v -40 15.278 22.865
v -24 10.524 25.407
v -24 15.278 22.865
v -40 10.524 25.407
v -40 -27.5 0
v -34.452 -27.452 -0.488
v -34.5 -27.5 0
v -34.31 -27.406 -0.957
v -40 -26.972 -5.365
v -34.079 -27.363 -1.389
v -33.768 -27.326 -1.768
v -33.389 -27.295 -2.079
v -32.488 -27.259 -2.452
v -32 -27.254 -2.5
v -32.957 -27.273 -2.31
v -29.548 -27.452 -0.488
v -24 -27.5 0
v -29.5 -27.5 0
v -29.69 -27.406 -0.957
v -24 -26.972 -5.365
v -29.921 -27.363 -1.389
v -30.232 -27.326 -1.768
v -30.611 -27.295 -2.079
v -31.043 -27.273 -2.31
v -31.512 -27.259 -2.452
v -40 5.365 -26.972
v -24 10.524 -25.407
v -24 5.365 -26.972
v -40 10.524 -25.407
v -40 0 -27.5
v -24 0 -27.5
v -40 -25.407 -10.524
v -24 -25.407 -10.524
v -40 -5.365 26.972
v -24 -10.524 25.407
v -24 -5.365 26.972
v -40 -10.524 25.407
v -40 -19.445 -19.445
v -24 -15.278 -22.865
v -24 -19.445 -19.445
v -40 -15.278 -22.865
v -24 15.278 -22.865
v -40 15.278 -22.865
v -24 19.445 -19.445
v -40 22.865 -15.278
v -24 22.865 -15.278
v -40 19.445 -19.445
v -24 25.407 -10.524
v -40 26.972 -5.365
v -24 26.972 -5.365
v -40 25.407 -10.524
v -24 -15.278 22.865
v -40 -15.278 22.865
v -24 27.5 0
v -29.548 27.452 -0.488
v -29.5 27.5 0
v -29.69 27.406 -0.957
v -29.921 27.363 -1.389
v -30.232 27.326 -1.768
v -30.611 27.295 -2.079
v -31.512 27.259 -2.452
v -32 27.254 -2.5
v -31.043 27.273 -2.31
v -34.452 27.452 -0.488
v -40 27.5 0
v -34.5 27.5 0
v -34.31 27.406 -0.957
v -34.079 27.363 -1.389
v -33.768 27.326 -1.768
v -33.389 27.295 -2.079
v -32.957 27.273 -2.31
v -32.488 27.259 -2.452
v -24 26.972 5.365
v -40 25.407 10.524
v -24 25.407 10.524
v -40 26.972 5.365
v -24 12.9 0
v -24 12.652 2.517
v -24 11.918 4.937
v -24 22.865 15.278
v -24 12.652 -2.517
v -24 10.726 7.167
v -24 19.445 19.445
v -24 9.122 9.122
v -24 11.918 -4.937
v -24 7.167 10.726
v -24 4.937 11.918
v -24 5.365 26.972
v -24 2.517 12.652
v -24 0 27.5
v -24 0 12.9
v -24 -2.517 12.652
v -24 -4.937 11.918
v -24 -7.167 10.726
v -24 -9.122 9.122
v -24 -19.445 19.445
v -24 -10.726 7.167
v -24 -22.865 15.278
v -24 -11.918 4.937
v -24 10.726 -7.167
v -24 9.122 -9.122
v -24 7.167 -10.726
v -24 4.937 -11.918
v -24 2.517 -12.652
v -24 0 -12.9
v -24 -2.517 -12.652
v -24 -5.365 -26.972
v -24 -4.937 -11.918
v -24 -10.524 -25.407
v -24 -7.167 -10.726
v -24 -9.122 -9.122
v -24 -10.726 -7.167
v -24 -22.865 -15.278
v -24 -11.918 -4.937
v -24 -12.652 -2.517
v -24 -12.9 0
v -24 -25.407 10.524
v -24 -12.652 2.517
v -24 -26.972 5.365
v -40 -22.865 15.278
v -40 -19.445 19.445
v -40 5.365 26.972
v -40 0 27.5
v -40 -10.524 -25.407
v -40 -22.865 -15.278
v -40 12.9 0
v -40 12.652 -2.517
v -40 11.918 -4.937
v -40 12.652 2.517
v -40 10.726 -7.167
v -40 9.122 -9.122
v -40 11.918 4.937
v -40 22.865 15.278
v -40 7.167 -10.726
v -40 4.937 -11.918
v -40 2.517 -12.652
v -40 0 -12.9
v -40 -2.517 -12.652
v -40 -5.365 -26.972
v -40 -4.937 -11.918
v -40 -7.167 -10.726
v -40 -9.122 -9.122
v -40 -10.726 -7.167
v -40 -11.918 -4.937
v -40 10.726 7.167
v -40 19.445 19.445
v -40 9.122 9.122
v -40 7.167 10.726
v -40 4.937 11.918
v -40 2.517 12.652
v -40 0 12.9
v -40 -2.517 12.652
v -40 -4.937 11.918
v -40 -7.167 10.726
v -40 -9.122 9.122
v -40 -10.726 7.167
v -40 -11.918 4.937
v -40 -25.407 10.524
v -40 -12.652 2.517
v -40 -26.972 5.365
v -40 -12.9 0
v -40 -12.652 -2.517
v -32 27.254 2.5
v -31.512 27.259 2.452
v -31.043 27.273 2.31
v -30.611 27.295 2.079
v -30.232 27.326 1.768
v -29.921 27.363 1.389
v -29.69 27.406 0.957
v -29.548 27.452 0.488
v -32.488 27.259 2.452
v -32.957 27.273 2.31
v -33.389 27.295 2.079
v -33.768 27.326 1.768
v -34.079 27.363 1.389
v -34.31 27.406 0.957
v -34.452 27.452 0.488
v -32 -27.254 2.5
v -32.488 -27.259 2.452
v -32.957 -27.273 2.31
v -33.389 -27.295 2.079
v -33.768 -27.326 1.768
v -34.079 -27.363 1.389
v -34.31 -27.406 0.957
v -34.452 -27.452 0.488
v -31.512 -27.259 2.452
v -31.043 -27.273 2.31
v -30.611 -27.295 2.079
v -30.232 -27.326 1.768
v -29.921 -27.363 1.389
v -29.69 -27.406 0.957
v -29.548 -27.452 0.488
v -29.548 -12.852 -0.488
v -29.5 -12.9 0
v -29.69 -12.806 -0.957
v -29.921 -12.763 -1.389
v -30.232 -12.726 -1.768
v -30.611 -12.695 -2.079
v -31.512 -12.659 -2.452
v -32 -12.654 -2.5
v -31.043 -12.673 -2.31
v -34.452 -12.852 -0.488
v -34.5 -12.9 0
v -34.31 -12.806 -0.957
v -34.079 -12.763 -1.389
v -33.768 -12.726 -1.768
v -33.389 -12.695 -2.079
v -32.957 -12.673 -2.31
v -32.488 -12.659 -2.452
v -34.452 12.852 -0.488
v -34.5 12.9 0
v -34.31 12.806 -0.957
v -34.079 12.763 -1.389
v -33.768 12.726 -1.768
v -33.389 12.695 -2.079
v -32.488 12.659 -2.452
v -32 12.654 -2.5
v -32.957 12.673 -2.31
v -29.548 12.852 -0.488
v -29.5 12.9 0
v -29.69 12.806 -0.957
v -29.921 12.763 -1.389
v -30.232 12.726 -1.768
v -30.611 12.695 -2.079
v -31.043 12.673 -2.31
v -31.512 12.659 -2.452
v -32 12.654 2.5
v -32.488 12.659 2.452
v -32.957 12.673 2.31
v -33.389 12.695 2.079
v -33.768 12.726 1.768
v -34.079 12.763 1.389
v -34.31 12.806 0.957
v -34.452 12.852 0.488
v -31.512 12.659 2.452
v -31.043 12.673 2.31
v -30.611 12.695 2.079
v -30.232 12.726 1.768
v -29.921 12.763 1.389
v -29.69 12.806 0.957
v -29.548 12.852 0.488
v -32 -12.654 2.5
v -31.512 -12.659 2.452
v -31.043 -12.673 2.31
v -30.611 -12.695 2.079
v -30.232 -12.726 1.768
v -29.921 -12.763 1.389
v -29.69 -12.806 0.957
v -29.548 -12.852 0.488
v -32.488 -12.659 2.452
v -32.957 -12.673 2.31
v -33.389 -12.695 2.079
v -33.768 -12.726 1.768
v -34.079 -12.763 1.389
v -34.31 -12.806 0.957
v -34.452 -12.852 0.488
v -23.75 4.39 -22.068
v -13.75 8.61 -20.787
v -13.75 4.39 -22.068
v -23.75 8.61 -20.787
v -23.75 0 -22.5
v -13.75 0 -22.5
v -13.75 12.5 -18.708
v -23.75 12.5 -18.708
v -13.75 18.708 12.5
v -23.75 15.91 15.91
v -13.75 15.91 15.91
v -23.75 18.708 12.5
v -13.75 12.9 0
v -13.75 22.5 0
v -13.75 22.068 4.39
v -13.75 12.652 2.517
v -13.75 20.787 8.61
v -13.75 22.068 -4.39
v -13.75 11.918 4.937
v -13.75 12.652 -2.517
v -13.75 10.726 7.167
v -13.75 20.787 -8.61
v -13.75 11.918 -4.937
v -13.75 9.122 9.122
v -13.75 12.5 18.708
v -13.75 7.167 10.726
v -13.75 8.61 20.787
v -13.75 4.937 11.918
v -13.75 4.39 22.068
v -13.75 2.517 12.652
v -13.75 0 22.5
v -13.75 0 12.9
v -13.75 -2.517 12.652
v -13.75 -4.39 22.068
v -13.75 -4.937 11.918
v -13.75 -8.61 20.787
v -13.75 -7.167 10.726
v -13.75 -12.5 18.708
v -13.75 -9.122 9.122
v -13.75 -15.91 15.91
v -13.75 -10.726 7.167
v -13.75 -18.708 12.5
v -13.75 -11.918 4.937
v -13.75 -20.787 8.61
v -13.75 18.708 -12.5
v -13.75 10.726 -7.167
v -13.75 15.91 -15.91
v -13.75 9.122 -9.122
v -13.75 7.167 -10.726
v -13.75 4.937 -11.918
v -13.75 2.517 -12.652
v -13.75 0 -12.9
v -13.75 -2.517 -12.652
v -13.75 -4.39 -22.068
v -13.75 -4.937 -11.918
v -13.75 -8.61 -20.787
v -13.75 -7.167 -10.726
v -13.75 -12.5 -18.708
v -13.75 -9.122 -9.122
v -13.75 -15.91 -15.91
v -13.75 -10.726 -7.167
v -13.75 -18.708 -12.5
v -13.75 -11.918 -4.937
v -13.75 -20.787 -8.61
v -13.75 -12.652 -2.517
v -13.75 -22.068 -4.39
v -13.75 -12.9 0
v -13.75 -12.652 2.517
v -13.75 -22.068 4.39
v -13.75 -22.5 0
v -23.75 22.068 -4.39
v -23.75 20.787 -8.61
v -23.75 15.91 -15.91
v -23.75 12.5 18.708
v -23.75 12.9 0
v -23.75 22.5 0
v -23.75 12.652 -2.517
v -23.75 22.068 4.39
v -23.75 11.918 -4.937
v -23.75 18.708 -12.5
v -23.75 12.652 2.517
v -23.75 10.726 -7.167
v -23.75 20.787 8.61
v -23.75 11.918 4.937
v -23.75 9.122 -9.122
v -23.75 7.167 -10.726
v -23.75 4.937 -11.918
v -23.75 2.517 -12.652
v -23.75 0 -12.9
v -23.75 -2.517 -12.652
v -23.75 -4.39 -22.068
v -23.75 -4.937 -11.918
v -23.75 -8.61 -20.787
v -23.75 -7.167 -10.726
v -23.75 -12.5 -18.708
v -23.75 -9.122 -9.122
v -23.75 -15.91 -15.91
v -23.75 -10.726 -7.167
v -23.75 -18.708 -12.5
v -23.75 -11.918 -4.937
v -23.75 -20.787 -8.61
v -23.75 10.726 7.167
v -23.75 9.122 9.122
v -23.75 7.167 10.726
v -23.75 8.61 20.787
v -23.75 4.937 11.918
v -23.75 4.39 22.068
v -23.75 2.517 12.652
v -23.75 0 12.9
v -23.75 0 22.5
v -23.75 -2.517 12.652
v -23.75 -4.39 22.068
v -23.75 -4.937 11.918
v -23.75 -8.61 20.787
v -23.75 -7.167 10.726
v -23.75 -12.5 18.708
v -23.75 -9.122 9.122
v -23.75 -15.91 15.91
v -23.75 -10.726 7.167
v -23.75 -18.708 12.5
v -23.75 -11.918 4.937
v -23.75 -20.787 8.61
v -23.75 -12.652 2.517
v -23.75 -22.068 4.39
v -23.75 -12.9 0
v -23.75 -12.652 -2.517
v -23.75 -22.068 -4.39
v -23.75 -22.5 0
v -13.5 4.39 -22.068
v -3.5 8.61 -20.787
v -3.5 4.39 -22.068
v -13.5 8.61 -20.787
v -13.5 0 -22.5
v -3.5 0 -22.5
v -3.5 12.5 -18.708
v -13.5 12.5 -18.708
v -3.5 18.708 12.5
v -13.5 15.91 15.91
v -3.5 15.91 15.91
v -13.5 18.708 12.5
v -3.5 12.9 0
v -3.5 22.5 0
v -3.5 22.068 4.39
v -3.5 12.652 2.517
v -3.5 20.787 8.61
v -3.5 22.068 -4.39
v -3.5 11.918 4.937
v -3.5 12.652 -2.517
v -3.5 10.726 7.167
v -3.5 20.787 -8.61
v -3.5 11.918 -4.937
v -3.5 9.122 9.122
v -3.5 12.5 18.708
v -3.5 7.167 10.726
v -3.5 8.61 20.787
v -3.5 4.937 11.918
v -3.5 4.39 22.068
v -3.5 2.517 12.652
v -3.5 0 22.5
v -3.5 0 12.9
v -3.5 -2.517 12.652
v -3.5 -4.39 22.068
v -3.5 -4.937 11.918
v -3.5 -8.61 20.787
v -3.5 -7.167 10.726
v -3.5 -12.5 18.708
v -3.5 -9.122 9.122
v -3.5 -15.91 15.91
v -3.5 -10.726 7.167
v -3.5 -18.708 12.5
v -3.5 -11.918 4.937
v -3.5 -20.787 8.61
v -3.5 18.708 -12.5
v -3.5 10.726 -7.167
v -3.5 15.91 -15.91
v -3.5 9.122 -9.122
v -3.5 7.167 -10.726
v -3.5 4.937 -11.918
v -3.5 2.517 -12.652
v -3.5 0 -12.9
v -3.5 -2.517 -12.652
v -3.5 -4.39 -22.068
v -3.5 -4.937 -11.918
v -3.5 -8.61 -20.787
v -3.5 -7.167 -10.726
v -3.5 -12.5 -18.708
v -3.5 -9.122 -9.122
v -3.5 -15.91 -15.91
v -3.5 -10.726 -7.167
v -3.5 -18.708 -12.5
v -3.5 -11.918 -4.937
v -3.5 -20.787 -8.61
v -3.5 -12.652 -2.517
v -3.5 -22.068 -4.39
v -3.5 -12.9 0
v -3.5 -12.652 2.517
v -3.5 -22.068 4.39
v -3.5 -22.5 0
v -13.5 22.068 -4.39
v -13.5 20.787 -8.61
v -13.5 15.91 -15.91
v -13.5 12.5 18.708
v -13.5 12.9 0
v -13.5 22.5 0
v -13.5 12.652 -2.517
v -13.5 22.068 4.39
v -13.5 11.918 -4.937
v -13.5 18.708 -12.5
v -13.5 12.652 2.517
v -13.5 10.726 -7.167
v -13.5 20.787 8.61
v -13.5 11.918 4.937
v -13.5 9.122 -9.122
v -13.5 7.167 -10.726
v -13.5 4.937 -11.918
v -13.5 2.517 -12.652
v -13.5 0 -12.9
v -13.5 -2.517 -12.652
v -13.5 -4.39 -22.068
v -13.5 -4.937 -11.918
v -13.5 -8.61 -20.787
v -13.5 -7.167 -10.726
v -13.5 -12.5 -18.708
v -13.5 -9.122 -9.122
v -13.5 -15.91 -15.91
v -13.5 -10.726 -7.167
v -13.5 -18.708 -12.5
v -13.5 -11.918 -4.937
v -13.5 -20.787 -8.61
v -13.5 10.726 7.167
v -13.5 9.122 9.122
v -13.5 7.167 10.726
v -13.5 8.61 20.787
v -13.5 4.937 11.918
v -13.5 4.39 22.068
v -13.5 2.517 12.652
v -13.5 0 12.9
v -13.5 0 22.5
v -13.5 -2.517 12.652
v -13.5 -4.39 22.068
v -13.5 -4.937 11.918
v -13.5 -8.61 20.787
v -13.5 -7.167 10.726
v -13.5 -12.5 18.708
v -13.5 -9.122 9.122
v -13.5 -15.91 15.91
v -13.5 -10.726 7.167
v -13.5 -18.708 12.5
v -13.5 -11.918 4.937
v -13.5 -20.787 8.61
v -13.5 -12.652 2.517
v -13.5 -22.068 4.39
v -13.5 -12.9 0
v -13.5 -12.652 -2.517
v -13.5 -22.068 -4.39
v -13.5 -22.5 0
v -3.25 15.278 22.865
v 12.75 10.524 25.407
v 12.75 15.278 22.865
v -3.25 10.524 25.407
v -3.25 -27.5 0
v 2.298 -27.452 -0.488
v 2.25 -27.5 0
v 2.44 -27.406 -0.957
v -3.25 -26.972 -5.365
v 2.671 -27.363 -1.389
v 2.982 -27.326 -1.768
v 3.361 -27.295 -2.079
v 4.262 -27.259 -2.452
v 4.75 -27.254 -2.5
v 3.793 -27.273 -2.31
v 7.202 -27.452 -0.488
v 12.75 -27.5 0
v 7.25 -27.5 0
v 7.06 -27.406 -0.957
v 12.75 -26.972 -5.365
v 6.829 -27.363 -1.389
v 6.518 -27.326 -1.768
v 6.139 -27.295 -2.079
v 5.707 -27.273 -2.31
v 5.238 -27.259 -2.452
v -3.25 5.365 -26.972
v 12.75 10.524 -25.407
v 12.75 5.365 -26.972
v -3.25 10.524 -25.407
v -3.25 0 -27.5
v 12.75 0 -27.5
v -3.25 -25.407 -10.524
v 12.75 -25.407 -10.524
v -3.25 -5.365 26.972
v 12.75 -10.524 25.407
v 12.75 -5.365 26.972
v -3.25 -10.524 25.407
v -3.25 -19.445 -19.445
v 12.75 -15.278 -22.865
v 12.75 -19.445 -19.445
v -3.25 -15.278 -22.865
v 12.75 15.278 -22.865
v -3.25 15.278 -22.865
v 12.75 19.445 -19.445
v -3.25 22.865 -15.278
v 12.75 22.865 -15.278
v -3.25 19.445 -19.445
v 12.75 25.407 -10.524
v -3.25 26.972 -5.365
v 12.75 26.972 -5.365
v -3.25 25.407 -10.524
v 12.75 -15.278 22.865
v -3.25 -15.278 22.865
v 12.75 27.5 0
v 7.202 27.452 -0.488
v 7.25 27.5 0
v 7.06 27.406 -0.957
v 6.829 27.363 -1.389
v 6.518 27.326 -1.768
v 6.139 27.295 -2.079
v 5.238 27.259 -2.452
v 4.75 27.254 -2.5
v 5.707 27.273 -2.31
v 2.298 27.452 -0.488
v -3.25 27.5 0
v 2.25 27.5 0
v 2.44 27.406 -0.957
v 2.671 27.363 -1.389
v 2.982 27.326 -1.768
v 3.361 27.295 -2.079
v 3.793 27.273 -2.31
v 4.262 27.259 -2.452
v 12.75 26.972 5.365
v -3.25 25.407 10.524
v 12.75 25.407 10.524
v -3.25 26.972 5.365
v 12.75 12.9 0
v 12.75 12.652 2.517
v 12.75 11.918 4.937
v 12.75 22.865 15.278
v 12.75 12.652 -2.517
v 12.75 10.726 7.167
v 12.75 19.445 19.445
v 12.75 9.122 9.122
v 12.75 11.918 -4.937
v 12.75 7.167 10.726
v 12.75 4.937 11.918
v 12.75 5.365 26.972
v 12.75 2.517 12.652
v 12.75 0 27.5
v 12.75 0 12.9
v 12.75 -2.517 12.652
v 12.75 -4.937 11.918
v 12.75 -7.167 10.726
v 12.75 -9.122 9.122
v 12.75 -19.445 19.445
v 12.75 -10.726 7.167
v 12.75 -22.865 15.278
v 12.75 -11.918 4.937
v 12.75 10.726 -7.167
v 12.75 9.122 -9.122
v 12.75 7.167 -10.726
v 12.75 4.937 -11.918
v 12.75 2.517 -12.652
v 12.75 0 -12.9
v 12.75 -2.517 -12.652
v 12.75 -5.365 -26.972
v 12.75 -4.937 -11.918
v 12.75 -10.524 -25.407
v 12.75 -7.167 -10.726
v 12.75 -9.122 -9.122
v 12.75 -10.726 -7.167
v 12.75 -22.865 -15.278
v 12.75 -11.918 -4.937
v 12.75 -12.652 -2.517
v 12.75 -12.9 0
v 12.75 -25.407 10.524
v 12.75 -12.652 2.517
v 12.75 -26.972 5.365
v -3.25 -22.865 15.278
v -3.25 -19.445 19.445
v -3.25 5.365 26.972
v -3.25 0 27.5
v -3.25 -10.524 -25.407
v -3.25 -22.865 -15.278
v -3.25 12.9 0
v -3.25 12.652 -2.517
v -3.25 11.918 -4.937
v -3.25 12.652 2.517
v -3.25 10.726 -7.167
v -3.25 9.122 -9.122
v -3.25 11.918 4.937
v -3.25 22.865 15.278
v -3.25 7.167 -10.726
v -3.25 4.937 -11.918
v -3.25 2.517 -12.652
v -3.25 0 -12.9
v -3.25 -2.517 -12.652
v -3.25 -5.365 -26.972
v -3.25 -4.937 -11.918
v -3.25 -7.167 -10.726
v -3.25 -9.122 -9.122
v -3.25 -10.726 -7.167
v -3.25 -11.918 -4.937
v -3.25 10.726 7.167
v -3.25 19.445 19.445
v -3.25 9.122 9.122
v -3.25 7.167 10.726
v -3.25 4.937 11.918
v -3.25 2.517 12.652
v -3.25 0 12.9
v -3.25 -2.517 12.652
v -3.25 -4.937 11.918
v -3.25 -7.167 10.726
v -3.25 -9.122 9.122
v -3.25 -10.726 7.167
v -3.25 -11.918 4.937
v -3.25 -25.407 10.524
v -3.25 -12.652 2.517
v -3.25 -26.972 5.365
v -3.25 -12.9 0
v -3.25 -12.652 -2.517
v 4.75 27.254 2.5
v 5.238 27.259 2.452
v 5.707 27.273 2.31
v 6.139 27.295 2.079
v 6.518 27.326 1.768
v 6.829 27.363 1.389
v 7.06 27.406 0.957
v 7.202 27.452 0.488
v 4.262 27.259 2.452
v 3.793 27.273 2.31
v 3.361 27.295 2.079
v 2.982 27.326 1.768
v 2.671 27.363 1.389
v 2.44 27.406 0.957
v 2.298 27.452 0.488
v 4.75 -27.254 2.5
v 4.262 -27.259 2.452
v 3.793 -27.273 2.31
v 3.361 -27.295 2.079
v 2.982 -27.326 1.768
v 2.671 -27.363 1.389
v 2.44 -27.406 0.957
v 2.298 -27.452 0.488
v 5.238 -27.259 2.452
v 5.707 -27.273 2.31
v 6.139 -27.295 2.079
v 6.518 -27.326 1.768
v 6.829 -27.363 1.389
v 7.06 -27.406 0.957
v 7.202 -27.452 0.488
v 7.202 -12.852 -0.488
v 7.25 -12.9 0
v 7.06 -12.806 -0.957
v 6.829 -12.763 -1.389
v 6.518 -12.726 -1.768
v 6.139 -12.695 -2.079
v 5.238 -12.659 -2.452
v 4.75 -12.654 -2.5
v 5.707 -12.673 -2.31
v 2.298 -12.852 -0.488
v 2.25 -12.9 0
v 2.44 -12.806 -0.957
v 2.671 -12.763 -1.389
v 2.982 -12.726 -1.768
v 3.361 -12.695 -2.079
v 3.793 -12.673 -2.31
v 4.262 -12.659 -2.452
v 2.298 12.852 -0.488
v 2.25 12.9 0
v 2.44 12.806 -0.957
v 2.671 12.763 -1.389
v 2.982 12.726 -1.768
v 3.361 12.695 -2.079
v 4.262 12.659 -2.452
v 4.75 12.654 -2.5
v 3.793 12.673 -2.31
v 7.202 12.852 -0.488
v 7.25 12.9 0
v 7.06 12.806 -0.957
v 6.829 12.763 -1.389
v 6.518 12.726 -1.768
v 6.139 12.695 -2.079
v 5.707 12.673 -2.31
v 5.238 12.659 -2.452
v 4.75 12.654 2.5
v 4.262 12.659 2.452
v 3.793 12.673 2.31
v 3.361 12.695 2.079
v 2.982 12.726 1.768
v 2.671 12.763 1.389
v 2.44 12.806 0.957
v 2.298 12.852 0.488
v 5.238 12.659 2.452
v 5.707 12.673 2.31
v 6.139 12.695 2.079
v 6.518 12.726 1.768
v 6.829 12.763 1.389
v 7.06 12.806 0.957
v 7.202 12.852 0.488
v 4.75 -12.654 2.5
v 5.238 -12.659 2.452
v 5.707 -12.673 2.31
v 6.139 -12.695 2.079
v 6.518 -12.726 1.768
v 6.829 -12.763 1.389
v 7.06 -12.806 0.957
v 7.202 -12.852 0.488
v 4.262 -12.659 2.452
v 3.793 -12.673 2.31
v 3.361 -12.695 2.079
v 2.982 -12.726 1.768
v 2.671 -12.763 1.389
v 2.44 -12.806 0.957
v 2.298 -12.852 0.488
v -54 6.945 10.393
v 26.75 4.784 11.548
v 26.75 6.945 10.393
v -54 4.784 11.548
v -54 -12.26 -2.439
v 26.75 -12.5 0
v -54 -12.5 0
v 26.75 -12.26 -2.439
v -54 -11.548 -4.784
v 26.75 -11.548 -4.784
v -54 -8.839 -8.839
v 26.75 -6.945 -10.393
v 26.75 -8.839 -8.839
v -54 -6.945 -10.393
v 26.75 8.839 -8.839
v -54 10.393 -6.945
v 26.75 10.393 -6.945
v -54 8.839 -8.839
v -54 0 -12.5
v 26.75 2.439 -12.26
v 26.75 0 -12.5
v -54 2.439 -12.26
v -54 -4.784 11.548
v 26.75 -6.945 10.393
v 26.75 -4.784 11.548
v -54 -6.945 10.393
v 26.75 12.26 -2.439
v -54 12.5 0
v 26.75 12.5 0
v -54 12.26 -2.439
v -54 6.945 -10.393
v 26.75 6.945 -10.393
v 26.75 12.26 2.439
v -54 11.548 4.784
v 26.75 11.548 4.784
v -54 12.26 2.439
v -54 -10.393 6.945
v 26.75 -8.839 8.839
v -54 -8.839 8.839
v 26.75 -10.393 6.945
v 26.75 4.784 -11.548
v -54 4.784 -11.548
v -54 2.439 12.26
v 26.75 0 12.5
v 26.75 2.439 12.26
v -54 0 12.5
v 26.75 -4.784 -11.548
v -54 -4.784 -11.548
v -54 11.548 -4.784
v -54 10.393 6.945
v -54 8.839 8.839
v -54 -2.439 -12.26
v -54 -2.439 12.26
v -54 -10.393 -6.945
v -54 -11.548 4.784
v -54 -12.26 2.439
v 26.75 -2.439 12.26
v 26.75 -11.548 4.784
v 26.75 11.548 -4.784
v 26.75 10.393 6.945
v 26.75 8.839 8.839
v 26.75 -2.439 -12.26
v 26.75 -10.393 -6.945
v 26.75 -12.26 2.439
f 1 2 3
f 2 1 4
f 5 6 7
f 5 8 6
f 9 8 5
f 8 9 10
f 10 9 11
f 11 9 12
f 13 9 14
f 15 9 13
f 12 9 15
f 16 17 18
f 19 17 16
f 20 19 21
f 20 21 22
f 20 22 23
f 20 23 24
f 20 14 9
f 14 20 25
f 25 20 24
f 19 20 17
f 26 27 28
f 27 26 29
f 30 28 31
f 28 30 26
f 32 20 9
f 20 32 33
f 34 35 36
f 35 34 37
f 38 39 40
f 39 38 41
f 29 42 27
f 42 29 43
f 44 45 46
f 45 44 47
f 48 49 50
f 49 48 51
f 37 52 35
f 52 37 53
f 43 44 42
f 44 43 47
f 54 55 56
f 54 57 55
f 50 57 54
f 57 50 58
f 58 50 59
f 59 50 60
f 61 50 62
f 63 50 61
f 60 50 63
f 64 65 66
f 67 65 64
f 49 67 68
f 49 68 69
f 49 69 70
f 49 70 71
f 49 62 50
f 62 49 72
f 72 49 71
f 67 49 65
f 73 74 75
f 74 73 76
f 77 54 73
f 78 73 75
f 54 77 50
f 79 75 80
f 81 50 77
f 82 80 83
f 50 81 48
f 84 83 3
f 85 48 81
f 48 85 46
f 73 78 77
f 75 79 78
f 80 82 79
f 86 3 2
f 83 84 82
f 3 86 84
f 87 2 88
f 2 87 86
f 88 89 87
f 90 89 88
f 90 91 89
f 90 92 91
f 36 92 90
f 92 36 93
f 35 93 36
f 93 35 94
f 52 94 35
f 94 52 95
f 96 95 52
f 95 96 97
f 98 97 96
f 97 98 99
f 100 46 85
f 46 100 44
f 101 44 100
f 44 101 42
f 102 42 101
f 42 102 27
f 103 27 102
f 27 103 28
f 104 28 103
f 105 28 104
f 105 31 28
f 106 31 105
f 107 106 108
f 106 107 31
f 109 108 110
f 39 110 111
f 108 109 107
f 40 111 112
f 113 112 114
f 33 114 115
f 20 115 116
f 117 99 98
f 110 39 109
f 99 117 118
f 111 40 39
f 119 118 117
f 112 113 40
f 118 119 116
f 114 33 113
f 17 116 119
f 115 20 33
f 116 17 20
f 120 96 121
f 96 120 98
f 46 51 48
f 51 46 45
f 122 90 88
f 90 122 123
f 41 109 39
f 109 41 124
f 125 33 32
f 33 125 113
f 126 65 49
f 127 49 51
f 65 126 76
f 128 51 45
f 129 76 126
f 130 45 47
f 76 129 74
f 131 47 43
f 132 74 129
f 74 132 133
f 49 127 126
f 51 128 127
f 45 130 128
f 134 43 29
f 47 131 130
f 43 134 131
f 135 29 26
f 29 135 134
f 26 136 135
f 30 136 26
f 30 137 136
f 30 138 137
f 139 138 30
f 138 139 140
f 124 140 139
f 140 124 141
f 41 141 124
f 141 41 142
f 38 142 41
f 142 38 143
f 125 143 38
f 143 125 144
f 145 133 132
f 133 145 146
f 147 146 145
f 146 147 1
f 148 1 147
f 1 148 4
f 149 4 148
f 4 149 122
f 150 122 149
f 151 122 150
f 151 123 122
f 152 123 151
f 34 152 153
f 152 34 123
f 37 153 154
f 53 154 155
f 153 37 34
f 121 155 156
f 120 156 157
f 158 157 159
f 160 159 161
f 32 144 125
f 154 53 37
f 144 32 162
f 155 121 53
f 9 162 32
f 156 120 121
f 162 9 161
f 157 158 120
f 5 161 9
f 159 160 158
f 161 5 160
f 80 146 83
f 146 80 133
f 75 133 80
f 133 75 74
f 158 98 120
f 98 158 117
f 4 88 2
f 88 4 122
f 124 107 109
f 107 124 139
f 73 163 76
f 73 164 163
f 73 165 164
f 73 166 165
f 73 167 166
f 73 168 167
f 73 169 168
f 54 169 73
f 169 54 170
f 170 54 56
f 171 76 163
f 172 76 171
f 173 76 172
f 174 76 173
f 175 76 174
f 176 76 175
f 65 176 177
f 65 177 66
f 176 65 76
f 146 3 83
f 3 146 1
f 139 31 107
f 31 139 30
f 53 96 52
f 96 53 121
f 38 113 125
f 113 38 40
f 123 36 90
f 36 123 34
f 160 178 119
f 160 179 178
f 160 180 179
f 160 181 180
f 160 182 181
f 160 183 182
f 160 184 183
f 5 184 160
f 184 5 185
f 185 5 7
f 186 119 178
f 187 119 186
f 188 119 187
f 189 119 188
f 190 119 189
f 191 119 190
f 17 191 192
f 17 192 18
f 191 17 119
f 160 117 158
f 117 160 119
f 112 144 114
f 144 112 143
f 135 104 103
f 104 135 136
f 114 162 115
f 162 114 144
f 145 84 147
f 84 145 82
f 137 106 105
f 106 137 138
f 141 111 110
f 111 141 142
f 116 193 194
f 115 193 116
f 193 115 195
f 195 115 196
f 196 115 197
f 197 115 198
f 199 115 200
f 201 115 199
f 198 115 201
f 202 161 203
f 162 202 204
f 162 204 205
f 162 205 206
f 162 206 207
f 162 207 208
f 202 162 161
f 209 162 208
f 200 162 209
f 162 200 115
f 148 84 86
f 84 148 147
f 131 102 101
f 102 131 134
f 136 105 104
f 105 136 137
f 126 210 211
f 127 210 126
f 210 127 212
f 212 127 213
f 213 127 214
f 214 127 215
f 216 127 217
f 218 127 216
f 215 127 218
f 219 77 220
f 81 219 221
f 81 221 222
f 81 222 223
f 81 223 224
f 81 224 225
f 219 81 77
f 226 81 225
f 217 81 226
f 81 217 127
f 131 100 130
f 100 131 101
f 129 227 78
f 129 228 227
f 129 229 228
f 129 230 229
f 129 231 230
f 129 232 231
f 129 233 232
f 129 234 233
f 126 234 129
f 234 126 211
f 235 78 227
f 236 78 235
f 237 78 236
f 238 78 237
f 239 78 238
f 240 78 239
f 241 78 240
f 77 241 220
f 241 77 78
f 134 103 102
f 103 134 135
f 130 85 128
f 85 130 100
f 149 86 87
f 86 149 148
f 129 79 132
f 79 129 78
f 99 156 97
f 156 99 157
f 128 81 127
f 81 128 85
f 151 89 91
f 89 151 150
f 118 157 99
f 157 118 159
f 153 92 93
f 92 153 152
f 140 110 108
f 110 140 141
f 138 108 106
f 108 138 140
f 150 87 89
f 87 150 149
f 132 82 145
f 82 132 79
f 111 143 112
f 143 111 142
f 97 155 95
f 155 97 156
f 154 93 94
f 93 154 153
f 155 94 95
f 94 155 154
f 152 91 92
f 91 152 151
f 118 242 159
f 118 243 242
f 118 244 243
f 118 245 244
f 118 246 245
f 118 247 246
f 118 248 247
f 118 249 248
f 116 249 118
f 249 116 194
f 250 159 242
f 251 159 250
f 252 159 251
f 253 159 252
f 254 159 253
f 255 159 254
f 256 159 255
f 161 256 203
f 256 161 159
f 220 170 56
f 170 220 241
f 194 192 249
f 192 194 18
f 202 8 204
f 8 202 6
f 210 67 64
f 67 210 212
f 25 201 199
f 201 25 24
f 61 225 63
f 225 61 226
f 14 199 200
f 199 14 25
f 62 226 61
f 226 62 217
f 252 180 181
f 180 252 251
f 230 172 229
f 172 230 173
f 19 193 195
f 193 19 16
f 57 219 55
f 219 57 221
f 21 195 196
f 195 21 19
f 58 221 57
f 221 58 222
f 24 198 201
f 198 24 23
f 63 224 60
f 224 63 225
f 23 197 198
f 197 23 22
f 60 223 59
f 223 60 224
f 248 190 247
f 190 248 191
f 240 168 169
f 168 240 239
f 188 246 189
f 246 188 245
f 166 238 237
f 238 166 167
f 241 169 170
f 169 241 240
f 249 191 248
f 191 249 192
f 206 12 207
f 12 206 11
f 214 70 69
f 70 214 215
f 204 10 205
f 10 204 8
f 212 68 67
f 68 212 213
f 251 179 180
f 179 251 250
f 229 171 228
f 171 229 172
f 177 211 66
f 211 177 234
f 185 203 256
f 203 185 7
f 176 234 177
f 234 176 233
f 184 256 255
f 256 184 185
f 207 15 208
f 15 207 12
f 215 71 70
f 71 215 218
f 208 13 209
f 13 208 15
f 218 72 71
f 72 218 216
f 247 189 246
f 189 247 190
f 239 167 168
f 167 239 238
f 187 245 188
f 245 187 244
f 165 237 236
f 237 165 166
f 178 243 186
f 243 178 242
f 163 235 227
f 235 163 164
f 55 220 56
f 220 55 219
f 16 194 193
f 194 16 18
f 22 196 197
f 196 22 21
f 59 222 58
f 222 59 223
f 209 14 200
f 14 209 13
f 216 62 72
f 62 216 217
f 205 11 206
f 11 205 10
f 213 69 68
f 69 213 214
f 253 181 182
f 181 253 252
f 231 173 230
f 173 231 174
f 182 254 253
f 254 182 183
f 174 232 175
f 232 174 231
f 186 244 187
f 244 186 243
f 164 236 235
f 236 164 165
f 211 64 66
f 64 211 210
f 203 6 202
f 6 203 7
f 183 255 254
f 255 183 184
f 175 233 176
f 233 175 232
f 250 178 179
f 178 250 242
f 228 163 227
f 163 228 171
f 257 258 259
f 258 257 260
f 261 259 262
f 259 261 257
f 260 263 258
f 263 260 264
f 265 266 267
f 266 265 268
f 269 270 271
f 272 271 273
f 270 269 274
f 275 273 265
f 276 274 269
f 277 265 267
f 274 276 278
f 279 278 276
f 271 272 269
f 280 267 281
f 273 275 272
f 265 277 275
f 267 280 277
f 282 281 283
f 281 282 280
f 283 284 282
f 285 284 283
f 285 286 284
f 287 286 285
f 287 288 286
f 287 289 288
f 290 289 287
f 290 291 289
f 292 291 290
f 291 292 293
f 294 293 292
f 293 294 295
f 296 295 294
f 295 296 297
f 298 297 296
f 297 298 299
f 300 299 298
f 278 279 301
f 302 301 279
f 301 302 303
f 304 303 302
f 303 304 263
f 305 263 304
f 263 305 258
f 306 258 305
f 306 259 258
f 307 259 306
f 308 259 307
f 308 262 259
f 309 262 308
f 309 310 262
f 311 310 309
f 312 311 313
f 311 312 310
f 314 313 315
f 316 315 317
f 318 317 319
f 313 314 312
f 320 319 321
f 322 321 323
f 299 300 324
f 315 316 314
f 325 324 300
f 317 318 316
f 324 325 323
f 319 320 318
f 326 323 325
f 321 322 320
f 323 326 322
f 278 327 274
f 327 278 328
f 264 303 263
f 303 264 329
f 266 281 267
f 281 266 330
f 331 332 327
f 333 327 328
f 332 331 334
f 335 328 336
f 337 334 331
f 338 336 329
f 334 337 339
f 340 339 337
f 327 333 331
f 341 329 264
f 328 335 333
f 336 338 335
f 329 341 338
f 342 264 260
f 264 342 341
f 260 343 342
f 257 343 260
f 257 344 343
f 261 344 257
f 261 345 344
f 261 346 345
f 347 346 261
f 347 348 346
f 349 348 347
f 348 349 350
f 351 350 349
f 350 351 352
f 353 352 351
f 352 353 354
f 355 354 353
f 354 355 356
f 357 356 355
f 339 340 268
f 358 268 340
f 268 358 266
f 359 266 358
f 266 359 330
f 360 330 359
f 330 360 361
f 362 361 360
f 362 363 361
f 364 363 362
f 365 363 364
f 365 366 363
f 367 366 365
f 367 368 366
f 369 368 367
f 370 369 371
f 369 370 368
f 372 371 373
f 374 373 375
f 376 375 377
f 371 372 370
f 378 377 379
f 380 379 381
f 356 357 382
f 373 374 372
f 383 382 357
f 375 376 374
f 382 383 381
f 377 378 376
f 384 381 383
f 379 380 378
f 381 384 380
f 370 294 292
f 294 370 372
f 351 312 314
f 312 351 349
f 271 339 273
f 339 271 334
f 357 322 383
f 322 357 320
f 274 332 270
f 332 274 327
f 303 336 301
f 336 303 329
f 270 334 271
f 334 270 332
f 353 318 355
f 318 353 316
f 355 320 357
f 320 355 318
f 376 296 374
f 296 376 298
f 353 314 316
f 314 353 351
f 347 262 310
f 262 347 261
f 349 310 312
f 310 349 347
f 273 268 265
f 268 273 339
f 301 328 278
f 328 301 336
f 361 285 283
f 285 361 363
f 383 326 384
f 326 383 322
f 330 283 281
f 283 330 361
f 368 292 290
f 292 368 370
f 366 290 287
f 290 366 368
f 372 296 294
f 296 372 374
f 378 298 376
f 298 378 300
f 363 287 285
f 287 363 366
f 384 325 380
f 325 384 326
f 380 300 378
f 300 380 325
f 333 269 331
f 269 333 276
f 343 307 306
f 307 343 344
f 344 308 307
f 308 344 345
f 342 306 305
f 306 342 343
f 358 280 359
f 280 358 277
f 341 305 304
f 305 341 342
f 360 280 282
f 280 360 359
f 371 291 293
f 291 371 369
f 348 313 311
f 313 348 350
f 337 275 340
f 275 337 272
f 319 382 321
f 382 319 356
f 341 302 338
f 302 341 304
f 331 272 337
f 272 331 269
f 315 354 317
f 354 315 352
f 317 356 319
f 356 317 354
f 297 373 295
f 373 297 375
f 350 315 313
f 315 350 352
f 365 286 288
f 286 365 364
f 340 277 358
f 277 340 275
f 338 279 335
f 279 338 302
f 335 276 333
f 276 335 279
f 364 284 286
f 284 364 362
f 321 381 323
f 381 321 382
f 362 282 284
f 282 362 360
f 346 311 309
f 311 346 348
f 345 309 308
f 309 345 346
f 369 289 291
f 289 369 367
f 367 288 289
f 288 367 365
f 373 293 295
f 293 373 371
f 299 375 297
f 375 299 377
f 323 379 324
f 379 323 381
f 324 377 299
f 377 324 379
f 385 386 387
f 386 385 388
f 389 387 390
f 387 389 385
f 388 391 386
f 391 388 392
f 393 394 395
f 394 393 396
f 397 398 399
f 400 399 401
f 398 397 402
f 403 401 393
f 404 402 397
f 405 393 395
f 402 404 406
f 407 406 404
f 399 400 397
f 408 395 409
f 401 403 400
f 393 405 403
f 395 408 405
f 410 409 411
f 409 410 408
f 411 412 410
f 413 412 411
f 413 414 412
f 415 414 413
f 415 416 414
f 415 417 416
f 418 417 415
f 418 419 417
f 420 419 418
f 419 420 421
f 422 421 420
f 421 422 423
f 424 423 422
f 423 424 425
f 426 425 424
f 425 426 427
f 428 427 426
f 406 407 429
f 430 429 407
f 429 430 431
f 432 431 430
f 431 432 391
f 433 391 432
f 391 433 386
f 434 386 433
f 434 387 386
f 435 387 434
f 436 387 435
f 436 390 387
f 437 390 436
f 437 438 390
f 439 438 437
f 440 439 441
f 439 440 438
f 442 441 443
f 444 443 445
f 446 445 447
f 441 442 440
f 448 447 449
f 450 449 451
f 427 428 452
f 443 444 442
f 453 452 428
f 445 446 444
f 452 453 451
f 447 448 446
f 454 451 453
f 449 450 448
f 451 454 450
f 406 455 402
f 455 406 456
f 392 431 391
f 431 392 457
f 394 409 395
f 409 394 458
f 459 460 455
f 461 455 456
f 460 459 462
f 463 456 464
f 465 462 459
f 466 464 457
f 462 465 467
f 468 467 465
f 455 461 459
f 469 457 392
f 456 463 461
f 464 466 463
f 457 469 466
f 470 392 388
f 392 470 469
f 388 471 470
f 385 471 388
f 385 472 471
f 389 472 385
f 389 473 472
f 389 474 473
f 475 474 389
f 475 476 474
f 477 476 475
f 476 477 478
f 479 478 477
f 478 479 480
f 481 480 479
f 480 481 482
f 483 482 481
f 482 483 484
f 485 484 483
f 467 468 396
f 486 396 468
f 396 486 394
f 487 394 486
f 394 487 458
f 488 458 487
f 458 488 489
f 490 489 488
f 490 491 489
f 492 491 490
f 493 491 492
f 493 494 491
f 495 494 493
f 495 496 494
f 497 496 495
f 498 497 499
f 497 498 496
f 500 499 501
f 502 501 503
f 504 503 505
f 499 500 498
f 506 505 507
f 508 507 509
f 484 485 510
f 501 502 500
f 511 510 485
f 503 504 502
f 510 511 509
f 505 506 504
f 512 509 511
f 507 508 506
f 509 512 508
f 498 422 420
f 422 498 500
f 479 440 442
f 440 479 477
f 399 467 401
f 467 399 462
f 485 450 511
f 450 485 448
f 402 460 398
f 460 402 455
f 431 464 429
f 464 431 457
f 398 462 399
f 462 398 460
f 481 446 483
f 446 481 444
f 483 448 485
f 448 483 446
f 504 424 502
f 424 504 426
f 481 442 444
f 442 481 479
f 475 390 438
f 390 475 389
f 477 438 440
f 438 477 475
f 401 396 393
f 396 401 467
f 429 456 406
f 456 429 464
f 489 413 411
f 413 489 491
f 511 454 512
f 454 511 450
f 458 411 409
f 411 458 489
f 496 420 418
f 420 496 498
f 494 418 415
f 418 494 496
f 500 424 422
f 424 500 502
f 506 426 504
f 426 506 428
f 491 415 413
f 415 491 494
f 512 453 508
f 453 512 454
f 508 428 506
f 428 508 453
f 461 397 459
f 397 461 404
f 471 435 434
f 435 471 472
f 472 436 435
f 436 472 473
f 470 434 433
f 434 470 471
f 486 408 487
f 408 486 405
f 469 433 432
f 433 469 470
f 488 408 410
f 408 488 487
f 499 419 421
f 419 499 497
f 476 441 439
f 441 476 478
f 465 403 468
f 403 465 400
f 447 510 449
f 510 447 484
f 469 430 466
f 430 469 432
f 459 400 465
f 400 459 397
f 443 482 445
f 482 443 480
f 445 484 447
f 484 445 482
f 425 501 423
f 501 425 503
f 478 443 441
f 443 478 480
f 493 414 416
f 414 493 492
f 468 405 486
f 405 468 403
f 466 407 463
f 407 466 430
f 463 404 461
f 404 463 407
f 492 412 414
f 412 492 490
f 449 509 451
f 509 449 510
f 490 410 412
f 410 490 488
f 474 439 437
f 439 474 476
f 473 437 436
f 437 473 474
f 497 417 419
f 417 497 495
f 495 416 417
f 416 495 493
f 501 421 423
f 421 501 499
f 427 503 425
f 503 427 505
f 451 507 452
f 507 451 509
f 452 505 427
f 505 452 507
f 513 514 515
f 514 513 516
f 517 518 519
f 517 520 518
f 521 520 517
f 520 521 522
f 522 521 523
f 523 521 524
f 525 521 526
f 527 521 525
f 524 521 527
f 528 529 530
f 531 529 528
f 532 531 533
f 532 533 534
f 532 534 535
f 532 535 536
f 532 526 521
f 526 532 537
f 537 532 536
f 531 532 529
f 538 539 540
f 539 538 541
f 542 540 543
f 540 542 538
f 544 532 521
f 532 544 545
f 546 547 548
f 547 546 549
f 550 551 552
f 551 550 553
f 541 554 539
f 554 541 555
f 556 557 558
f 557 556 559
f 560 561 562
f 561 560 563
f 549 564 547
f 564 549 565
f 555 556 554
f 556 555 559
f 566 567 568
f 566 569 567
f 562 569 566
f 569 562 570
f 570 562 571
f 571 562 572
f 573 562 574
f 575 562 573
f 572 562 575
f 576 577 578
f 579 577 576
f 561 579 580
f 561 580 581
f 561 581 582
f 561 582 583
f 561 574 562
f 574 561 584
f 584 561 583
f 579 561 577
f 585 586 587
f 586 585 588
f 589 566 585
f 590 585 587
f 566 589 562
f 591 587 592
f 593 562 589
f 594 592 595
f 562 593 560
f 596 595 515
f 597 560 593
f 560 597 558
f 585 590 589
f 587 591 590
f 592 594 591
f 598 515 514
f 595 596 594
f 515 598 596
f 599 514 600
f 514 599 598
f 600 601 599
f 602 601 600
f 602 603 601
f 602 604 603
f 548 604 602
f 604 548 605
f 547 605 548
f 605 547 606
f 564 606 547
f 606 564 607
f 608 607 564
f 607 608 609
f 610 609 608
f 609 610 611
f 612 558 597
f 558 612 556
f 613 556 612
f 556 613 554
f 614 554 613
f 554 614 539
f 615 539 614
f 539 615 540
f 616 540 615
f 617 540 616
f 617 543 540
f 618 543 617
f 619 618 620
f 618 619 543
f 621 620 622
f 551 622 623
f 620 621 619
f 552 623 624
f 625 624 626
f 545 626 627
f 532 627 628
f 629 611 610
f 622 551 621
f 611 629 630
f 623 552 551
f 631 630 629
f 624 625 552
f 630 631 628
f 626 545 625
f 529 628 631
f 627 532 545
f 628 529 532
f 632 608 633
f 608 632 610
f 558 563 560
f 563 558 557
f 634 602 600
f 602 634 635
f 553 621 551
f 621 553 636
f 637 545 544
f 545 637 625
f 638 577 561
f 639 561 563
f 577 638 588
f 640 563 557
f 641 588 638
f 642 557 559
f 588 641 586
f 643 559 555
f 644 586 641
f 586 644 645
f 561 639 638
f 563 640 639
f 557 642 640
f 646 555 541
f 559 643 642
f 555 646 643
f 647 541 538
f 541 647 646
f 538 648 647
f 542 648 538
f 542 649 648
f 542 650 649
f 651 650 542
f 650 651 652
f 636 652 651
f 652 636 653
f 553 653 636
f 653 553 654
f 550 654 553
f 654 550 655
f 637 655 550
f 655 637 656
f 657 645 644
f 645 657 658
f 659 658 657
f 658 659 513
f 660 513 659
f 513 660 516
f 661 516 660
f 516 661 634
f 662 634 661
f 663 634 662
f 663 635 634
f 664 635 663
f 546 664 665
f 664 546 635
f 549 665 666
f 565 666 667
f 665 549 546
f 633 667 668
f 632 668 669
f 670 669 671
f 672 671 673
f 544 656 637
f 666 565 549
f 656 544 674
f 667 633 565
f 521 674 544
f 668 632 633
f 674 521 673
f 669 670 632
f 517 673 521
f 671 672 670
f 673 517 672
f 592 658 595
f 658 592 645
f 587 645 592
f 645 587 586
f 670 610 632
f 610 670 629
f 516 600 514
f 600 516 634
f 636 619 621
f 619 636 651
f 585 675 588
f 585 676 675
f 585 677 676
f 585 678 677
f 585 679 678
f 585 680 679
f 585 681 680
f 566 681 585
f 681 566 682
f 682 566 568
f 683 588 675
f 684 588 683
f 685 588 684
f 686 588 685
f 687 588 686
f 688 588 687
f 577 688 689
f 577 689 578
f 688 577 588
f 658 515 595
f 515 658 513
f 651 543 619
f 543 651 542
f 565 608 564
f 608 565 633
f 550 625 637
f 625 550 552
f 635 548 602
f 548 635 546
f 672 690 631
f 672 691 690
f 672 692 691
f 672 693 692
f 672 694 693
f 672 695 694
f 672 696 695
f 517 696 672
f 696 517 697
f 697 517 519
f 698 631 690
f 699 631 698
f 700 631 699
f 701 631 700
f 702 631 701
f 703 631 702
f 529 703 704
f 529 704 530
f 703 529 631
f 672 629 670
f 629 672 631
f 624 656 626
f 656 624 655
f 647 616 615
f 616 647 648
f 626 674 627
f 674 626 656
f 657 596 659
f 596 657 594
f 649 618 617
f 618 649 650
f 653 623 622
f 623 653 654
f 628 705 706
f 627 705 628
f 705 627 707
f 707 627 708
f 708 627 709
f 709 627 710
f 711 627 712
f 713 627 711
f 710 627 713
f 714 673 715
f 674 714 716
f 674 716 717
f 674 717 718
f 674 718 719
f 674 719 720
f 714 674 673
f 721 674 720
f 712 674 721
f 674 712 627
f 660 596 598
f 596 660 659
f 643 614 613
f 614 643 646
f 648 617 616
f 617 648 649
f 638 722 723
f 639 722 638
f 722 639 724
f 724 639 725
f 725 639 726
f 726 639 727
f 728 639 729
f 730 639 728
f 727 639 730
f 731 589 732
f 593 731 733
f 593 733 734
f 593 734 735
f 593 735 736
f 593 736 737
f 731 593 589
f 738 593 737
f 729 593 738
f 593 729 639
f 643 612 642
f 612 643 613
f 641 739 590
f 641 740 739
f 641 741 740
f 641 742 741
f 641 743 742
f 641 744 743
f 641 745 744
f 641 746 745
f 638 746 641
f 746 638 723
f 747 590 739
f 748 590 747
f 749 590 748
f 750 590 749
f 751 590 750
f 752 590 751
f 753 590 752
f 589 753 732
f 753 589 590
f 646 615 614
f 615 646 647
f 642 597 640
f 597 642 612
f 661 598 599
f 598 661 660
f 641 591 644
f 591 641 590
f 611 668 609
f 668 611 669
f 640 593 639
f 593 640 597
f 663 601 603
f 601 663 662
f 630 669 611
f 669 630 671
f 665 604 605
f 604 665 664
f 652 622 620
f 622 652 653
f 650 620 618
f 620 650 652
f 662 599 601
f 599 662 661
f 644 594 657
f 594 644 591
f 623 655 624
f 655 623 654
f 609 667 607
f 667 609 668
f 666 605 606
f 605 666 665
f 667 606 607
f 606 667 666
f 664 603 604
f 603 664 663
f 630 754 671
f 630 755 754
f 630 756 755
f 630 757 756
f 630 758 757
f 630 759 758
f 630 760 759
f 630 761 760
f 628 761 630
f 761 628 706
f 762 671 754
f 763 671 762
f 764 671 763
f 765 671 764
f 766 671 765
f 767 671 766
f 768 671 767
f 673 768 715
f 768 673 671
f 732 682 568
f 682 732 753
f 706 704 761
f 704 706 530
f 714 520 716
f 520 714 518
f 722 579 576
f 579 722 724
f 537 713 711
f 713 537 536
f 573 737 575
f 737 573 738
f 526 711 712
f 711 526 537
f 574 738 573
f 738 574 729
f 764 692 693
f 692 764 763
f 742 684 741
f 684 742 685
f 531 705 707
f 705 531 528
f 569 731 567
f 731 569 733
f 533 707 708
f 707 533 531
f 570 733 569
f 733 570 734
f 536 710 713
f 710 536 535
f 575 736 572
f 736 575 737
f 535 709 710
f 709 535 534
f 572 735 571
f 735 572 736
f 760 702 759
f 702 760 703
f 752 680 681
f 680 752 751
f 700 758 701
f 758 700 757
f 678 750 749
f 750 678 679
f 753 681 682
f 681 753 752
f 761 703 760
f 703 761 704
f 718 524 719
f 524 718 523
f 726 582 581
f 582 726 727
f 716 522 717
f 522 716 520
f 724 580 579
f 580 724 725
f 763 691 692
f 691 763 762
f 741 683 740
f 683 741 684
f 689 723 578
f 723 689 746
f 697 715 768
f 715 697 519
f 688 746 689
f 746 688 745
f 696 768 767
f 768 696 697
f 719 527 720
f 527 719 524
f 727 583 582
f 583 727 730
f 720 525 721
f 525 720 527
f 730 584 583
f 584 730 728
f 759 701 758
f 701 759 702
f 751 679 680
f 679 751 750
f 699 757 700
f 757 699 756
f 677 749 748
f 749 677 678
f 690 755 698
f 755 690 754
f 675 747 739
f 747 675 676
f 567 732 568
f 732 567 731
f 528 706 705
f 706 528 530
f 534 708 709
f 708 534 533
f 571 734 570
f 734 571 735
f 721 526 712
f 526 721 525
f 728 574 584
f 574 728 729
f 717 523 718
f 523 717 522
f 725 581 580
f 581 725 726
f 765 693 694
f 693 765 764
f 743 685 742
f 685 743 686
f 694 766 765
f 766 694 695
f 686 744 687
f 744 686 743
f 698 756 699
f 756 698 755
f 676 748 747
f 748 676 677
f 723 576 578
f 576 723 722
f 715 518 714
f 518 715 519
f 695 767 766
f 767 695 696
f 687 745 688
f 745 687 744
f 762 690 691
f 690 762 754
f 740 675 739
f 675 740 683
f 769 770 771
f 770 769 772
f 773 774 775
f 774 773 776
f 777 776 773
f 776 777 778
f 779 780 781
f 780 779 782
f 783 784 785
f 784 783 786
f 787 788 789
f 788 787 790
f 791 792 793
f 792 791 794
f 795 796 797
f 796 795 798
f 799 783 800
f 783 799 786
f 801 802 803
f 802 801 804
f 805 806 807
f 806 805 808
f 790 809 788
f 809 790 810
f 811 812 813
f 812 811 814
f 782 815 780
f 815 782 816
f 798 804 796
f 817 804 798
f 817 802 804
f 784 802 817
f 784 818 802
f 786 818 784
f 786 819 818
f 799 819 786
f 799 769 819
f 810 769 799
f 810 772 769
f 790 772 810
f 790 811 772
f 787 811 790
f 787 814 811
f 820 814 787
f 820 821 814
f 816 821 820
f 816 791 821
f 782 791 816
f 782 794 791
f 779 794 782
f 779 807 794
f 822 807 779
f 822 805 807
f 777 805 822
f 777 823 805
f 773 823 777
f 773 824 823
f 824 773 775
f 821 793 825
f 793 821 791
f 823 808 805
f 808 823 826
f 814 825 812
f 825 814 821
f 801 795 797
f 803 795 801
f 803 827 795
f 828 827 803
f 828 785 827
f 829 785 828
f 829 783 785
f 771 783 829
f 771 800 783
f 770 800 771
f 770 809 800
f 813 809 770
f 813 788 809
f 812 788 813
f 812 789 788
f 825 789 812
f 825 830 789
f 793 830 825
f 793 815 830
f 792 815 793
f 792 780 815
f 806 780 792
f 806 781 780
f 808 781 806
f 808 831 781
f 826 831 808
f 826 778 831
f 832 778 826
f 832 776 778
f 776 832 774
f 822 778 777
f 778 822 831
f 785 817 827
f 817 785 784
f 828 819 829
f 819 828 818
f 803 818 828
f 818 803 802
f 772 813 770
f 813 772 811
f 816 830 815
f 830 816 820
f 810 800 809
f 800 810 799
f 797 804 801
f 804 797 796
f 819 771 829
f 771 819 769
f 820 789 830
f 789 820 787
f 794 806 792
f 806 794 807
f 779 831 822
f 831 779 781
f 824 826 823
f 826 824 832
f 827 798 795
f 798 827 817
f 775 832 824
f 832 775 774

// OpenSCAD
$fn = 32;

// ------------------------------------------------------------------------
// Shaft with rings and collars: d25 shaft, 4 rings
// Every part is its own module, assembly() places them once.
// ------------------------------------------------------------------------

// --- part 1 ---
module shaft() {
  translate([0, 0, -40.375]) cylinder(h = 80.75, d = 25);
}

// --- part 2 ---
module collar_a() {
  difference() {
    cylinder(h = 16, d = 55);
    translate([0, 0, -1]) cylinder(h = 18, d = 25.8);
    translate([0, 0, 8]) rotate([90, 0, 0]) cylinder(h = 57, d = 5, center = true);
  }
}

// --- part 3 ---
module spacer_a() {
  difference() {
      translate([0, 0, 0]) cylinder(h = 10, d = 45);
      translate([0, 0, -1]) cylinder(h = 12, d = 25.8);
    }
}

// --- part 4 ---
module spacer_b() {
  difference() {
      translate([0, 0, 0]) cylinder(h = 10, d = 45);
      translate([0, 0, -1]) cylinder(h = 12, d = 25.8);
    }
}

// --- part 5 ---
module collar_b() {
  difference() {
    cylinder(h = 16, d = 55);
    translate([0, 0, -1]) cylinder(h = 18, d = 25.8);
    translate([0, 0, 8]) rotate([90, 0, 0]) cylinder(h = 57, d = 5, center = true);
  }
}

// --- assembly ---
module assembly() {
  translate([-13.625, 0, 0]) rotate([0, 90, 0]) shaft();
  translate([-40, 0, 0]) rotate([0, 90, 0]) collar_a();
  translate([-23.75, 0, 0]) rotate([0, 90, 0]) spacer_a();
  translate([-13.5, 0, 0]) rotate([0, 90, 0]) spacer_b();
  translate([-3.25, 0, 0]) rotate([0, 90, 0]) collar_b();
}

assembly();
